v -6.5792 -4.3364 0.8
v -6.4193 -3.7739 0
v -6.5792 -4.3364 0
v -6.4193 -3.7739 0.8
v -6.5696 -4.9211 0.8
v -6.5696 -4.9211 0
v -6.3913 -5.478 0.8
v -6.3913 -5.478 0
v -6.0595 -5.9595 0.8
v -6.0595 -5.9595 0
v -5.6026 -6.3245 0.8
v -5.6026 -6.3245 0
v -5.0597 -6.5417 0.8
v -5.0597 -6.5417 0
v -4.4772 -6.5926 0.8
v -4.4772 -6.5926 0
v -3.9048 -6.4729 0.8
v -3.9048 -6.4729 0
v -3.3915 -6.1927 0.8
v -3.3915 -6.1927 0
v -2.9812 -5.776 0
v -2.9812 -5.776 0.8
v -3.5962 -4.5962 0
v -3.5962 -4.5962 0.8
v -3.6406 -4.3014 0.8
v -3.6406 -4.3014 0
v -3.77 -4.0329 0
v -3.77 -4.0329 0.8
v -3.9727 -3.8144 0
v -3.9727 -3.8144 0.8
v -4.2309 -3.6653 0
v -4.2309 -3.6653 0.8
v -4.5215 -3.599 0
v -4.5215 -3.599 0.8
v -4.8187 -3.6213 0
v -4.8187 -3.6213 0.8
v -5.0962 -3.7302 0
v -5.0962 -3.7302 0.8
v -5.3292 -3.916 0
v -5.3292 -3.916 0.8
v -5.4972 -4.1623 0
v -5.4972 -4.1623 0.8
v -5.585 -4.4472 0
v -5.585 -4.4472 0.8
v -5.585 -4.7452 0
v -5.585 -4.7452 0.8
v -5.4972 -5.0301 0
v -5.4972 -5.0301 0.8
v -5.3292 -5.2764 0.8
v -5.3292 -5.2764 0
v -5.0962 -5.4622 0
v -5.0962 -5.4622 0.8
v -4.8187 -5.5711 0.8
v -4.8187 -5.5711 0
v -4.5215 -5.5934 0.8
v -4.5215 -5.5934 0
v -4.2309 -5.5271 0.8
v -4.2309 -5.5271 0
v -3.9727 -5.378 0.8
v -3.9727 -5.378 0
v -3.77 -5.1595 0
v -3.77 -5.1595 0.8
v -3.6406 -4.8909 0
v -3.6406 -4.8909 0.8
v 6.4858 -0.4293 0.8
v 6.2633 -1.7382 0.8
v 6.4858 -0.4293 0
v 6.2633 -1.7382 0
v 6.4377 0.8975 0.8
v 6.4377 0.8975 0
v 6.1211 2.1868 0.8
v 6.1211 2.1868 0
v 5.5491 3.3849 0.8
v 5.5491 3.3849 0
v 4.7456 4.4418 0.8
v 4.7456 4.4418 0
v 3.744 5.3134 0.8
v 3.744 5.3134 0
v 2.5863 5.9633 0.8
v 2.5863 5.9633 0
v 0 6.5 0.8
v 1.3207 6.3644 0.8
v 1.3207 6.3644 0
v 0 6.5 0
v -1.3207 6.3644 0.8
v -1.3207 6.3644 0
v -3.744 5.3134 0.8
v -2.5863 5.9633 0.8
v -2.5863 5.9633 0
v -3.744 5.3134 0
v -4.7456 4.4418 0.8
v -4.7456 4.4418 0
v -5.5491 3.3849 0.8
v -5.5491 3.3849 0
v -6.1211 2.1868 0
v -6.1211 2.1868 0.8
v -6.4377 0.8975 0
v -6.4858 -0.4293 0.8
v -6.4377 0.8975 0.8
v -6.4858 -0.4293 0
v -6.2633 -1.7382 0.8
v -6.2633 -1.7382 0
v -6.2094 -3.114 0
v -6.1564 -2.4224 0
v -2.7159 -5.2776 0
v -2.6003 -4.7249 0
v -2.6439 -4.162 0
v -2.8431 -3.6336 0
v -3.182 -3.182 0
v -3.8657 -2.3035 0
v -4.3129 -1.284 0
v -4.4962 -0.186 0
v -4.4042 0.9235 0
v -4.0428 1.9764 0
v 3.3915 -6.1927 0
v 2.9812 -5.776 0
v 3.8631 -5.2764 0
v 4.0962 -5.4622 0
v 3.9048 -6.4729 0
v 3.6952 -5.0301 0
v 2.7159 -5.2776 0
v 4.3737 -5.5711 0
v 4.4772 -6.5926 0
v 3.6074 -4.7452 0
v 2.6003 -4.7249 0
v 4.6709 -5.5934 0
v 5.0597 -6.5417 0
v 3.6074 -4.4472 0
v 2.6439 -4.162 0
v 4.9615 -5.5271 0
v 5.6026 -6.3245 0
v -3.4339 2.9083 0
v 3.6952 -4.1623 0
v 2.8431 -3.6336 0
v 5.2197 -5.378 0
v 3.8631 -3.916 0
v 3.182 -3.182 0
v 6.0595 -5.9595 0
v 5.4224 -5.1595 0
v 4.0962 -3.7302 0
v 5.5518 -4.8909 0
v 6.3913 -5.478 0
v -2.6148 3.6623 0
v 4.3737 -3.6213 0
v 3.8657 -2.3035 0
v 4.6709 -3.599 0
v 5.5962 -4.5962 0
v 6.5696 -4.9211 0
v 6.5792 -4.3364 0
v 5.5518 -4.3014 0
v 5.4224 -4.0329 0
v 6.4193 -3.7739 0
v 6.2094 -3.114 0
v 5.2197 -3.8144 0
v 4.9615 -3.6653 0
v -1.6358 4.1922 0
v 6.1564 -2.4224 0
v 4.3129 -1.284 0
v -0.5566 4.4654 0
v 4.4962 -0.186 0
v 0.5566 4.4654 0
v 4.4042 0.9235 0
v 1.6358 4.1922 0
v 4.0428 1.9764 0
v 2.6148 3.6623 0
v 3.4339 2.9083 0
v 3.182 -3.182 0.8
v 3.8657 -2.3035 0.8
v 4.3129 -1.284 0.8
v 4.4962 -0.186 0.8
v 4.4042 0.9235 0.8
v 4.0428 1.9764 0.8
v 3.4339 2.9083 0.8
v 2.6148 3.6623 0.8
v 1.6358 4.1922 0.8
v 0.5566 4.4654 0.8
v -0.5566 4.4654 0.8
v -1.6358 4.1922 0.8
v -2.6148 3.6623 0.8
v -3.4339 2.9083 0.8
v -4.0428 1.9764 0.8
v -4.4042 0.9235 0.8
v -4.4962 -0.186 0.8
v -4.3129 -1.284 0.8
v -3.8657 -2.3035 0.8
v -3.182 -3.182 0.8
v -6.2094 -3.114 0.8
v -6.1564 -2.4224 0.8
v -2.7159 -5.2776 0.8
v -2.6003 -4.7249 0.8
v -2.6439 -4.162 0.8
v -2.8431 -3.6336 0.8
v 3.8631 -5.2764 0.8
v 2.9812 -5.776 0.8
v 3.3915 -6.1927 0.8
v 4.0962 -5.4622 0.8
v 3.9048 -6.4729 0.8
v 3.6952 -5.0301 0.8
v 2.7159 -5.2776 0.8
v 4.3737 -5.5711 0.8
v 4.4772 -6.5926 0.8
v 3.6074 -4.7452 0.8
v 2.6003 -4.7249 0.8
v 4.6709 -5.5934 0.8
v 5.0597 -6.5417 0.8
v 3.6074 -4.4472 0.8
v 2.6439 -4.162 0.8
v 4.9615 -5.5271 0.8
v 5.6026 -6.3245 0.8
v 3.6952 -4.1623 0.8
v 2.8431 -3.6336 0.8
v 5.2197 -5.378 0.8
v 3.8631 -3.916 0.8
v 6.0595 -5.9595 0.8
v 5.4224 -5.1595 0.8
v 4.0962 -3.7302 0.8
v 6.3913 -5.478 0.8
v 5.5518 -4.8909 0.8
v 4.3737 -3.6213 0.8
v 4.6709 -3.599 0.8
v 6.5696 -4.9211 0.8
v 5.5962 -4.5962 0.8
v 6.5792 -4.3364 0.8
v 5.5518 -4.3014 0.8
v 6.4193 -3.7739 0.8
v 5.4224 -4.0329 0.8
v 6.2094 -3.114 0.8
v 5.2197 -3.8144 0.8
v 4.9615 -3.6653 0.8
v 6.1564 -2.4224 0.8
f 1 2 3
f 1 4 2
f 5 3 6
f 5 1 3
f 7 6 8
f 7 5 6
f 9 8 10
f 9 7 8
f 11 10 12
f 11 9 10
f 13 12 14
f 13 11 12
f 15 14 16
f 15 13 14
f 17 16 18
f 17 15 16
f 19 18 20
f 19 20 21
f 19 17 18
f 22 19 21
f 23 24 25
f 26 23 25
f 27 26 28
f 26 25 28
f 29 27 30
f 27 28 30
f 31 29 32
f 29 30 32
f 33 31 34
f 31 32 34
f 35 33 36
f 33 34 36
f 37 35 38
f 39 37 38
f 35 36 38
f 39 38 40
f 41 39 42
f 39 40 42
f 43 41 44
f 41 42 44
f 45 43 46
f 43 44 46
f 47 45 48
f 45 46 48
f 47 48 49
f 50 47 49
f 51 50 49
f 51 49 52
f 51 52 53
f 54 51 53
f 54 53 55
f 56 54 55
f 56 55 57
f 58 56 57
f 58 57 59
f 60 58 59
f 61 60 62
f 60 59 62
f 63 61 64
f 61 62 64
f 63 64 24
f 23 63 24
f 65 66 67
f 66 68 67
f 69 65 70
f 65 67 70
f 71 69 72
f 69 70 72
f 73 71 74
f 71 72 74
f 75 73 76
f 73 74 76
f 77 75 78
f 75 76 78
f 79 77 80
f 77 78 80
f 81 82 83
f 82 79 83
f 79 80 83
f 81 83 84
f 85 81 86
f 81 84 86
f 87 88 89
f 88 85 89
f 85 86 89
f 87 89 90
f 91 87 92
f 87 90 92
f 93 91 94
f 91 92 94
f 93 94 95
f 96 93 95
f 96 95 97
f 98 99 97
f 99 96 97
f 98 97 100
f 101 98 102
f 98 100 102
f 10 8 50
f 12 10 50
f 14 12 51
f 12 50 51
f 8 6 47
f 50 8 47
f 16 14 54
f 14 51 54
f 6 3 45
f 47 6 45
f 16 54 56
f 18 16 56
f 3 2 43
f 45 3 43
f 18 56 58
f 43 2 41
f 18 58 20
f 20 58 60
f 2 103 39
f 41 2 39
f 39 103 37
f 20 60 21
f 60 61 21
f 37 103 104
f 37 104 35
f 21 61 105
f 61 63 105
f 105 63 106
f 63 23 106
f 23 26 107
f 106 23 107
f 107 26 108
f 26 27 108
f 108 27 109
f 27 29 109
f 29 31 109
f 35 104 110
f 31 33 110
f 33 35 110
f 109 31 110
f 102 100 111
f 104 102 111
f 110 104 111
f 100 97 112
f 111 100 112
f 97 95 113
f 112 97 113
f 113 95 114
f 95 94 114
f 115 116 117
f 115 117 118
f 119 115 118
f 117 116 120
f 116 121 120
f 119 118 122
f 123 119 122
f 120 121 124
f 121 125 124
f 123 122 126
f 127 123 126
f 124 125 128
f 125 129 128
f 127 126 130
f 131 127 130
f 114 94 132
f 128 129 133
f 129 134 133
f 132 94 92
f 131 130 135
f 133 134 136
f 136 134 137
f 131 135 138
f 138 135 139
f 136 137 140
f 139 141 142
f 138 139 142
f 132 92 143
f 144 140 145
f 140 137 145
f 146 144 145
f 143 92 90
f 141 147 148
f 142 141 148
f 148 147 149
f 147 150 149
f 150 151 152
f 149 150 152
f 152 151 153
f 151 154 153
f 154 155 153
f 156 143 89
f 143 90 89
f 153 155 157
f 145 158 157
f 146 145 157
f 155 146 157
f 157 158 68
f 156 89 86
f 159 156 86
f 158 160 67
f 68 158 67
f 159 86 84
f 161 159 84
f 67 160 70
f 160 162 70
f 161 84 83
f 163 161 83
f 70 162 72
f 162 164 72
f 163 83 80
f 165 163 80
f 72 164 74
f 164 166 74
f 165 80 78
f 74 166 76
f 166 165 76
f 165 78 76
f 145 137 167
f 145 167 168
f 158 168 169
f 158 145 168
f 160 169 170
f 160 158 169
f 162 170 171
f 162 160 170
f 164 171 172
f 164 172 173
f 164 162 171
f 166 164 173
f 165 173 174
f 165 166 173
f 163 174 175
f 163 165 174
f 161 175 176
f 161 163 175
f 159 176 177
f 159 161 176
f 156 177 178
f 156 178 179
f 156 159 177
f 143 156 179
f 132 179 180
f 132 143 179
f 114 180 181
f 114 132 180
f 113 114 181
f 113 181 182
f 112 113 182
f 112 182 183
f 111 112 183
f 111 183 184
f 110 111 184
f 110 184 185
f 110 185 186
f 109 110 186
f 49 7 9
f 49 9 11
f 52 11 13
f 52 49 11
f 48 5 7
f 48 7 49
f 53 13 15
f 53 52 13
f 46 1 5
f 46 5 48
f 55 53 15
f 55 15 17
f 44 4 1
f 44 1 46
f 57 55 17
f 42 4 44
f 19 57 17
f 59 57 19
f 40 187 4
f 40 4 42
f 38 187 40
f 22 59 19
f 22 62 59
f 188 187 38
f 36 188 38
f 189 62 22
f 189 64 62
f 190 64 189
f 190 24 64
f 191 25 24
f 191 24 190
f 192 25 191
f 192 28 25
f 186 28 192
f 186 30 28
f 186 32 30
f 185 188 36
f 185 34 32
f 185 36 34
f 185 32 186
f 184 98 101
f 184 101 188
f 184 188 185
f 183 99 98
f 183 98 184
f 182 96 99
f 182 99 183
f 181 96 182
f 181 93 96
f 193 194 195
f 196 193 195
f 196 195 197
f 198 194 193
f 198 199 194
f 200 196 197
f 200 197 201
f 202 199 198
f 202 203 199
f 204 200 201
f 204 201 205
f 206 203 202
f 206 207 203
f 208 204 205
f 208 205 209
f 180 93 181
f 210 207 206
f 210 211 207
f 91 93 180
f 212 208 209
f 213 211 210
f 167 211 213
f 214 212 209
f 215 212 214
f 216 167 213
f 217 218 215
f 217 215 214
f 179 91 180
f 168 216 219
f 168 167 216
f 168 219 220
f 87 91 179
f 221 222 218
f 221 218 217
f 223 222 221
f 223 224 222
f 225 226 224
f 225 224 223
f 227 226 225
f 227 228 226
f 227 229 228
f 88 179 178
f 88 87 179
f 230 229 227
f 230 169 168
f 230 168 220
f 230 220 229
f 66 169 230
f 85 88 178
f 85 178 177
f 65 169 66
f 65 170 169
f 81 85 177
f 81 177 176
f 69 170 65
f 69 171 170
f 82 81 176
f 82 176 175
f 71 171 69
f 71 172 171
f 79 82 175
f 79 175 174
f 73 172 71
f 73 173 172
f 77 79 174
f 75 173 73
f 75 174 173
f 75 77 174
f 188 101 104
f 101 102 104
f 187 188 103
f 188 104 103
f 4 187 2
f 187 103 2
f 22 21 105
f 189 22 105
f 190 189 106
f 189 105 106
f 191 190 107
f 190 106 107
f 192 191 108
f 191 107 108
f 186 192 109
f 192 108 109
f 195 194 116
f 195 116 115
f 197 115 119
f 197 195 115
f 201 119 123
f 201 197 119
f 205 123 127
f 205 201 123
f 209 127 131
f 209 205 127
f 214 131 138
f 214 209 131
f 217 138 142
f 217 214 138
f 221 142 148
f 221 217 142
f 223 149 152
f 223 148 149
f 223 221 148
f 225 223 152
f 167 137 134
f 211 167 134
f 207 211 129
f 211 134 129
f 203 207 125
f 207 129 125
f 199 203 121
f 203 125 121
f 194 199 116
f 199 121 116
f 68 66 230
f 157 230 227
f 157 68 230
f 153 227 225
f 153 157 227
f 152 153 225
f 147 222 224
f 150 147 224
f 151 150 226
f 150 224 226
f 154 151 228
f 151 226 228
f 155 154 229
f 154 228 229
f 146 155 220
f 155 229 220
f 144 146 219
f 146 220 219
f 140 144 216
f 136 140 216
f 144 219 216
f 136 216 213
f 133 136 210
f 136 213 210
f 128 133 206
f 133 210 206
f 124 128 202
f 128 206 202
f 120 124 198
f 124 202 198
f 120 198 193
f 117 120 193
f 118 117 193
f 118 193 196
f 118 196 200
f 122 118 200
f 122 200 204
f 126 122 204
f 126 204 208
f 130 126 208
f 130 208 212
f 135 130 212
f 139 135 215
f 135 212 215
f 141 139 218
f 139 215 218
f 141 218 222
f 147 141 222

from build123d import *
from build123d.topology import SkipClean

# Parameters (mm, degrees)
SKETCH1_R           = 6.5
SKETCH1_R_2         = 4.5
BOSS_EXTRUDE1_DEPTH = 0.8
SKETCH2_R           = 2
BOSS_EXTRUDE2_DEPTH = 0.8
CUT_EXTRUDE1_START  = -0.8
CUT_EXTRUDE1_DEPTH  = 0.8
SKETCH4_R           = 1
CUT_EXTRUDE2_DEPTH  = 0.8
FILLET1_R           = 3


with BuildPart() as part:
    # Sketch1 → Boss-Extrude1 (new body)
    with BuildSketch(Plane.XY):
        Circle(SKETCH1_R)
        Circle(SKETCH1_R_2, mode=Mode.SUBTRACT)
    extrude(amount=BOSS_EXTRUDE1_DEPTH)

    # Sketch2 → Boss-Extrude2 (add)
    with BuildSketch(Plane.XY.offset(0.8)):
        with Locations((-4.596194078, -4.596194078)):
            Circle(SKETCH2_R)
        with Locations((4.596194078, -4.596194078)):
            Circle(SKETCH2_R)
    extrude(amount=-BOSS_EXTRUDE2_DEPTH)

    # Sketch3 → Cut-Extrude1 (cut)
    with SkipClean():  # the faces are left unmerged after this step: merging them gives an invalid solid
        with BuildSketch(Plane.XY.offset(0.8).offset(CUT_EXTRUDE1_START)):
            with BuildLine():
                ThreePointArc((-2.981245674, -5.775999847), (-2.602155556, -4.441887978), (-3.181980515, -3.181980515))
                ThreePointArc((-3.181980515, -3.181980515), (0, -4.5), (3.181980515, -3.181980515))
                ThreePointArc((3.181980515, -3.181980515), (2.602155556, -4.441887978), (2.981245674, -5.775999847))
                ThreePointArc((2.981245674, -5.775999847), (0, -6.5), (-2.981245674, -5.775999847))
            make_face()
        extrude(amount=CUT_EXTRUDE1_DEPTH, mode=Mode.SUBTRACT)

    # Sketch4 → Cut-Extrude2 (cut)
    with SkipClean():  # the faces are left unmerged after this step: merging them gives an invalid solid
        with BuildSketch(Plane.XY.offset(0.8)):
            with Locations((-4.596194078, -4.596194078)):
                Circle(SKETCH4_R)
            with Locations((4.596194078, -4.596194078)):
                Circle(SKETCH4_R)
        extrude(amount=-CUT_EXTRUDE2_DEPTH, mode=Mode.SUBTRACT)

    # Fillet1
    fillet1_edges = [part.edges().sort_by_distance(p)[0] for p in [
        (-5.775999847, -2.981245674, 0.4),
        (5.775999847, -2.981245674, 0.4),
    ]]
    fillet(fillet1_edges, radius=FILLET1_R)


solid = part.part
